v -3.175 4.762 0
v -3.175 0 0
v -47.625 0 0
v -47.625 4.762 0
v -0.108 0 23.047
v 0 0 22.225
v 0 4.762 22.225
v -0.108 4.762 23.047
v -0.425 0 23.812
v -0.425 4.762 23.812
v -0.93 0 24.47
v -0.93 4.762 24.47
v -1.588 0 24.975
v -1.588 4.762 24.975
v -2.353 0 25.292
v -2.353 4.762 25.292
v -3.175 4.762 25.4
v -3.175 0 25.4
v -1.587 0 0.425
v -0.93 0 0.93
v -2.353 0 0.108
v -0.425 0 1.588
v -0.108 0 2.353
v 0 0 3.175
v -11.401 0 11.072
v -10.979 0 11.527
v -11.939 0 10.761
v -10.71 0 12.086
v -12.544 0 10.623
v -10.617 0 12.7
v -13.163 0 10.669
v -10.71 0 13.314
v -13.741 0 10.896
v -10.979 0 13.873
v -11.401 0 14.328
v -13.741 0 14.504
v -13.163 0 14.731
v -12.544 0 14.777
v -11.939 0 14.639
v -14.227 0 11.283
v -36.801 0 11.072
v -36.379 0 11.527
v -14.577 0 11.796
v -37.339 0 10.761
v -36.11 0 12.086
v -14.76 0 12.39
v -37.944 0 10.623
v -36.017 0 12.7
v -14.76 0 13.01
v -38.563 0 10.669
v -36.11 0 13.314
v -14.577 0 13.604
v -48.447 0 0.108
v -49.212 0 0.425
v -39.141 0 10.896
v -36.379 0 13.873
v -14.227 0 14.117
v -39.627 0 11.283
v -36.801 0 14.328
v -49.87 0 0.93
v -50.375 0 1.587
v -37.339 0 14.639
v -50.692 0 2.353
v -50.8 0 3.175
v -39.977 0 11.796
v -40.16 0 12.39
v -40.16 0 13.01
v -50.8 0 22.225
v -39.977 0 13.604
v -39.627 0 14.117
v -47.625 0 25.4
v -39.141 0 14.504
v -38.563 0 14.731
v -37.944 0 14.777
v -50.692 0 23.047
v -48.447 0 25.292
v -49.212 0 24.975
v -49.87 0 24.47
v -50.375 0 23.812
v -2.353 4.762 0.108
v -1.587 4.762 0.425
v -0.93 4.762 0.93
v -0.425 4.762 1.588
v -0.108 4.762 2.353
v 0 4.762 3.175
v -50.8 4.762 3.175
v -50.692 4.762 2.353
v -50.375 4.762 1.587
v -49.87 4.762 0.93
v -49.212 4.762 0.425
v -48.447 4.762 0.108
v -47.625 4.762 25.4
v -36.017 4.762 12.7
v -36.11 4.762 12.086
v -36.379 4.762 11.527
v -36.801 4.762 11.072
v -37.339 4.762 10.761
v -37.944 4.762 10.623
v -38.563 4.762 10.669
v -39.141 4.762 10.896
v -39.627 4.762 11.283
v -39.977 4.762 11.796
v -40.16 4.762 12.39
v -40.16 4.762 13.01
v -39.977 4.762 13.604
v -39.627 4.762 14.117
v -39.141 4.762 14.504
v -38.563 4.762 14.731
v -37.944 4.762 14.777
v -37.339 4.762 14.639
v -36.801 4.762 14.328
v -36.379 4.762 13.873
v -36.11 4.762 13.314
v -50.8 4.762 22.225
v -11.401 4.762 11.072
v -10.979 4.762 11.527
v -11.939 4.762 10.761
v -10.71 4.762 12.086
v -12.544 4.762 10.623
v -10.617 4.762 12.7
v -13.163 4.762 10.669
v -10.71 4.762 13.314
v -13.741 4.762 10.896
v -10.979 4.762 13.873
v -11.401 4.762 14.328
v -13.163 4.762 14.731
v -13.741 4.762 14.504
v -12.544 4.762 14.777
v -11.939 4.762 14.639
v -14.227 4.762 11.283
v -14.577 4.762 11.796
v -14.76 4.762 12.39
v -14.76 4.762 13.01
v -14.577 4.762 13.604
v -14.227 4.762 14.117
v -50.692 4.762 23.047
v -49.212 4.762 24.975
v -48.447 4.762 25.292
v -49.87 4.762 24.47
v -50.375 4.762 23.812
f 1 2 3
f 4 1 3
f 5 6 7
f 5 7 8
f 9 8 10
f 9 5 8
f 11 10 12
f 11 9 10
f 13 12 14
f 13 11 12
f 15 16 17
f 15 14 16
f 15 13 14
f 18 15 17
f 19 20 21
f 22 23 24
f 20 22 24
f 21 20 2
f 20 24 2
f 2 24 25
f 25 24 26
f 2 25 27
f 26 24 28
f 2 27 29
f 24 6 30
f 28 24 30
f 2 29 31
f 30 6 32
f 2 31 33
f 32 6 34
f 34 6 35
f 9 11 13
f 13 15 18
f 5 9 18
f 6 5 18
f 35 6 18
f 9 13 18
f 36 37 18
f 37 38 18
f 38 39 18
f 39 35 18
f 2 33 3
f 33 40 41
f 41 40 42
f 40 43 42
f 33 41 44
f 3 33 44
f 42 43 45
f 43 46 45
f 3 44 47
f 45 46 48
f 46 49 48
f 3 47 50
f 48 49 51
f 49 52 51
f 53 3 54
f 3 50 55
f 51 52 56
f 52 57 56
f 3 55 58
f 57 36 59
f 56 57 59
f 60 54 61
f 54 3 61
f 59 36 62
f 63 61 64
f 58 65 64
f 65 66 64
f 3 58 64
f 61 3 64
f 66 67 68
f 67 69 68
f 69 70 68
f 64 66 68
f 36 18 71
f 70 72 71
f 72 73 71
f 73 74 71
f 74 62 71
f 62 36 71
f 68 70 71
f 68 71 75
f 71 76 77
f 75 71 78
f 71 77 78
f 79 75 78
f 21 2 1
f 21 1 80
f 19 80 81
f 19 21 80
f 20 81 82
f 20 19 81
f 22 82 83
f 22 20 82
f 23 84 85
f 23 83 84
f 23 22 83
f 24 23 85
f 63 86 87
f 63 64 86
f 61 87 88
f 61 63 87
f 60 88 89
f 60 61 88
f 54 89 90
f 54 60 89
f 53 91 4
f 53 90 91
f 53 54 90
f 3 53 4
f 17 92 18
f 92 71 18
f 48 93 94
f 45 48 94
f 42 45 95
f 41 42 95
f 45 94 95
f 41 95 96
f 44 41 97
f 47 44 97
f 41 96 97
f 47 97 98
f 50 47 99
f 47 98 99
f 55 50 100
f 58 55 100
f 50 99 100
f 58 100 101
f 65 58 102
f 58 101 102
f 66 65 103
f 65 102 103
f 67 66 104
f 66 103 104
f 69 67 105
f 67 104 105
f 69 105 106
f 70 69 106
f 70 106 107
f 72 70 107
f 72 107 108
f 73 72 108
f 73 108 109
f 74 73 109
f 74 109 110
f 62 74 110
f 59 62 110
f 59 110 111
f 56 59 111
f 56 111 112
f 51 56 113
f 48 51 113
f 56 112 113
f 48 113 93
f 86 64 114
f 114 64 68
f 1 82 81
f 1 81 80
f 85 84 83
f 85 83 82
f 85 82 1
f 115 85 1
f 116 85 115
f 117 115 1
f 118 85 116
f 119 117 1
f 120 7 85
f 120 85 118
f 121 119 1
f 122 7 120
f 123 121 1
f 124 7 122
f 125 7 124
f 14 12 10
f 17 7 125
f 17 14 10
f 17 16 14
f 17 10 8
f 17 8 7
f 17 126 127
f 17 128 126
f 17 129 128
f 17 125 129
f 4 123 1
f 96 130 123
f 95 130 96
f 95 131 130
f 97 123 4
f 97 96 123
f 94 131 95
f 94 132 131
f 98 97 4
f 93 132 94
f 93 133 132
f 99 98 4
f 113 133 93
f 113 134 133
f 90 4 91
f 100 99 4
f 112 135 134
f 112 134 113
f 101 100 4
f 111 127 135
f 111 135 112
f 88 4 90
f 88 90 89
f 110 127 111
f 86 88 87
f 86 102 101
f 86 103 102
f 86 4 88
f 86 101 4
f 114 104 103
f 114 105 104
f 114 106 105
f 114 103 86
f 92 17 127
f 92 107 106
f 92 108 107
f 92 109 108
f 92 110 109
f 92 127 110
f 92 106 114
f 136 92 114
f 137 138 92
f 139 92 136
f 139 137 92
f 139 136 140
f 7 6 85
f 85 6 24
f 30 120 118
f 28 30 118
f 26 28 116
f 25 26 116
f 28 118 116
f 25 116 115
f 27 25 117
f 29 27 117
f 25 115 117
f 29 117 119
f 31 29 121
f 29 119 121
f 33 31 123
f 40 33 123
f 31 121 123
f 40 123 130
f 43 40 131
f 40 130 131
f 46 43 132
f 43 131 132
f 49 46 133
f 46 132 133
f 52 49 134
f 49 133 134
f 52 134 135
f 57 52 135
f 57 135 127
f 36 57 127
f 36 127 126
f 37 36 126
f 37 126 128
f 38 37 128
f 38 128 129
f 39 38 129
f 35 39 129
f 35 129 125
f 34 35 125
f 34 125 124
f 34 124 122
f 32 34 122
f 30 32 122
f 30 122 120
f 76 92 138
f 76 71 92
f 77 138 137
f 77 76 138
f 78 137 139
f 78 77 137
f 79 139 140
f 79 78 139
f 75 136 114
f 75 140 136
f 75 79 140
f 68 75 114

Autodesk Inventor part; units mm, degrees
ref_plane "YZ Plane" through (0, 0, 0) normal (1, 0, 0) x (0, 1, 0)
ref_plane "XZ Plane" through (0, 0, 0) normal (0, 1, 0) x (-1, 0, 0)
ref_plane "XY Plane" through (0, 0, 0) normal (0, 0, 1) x (1, 0, 0)
sketch "Sketch1" plane through (0, 0, 0) normal (0, 1, 0) x (-1, 0, 0)
  line L0 (3.175, 0) -> (47.625, 0)
  line L1 (50.8, 3.175) -> (50.8, 22.225)
  line L2 (47.625, 25.4) -> (3.175, 25.4)
  line L3 (0, 22.225) -> (0, 3.175)
  arc A0 (3.175, 25.4) -> (0, 22.225) centre (3.175, 22.225) ccw
  arc A1 (0, 3.175) -> (3.175, 0) centre (3.175, 3.175) ccw
  arc A2 (47.625, 0) -> (50.8, 3.175) centre (47.625, 3.175) ccw
  arc A3 (50.8, 22.225) -> (47.625, 25.4) centre (47.625, 22.225) ccw
  point P0 (0, 0)
  point P1 (50.8, 25.4)
  point P2 (0, 25.4)
  dimension "d0" = 25.4
  dimension "d1" = 50.8
  dimension "d2" = 3.175
extrude "Extrusion1" add sketch "Sketch1" along normal blind 4.7625
sketch "Sketch2" plane through (0, 4.7625, 0) normal (0, 1, 0) x (1, 0, 0)
  line L0 (-3.175, 0) -> (-47.625, 0) projected
  line L1 (-50.8, -3.175) -> (-50.8, -22.225) projected
  line L2 (-47.625, -25.4) -> (-3.175, -25.4) projected
  circle A0 centre (-38.1, -12.7) radius 2.0828
  circle A1 centre (-12.7, -12.7) radius 2.0828
  point P0 (0, 0)
  dimension "d5" = 4.1656
  dimension "d6" = 12.7
  dimension "d7" = 12.7
  dimension "d10" = 25.4
extrude "Extrusion2" cut sketch "Sketch2" against normal blind 4.7625
properties part number "Spacer" material "Aluminum 6061"
